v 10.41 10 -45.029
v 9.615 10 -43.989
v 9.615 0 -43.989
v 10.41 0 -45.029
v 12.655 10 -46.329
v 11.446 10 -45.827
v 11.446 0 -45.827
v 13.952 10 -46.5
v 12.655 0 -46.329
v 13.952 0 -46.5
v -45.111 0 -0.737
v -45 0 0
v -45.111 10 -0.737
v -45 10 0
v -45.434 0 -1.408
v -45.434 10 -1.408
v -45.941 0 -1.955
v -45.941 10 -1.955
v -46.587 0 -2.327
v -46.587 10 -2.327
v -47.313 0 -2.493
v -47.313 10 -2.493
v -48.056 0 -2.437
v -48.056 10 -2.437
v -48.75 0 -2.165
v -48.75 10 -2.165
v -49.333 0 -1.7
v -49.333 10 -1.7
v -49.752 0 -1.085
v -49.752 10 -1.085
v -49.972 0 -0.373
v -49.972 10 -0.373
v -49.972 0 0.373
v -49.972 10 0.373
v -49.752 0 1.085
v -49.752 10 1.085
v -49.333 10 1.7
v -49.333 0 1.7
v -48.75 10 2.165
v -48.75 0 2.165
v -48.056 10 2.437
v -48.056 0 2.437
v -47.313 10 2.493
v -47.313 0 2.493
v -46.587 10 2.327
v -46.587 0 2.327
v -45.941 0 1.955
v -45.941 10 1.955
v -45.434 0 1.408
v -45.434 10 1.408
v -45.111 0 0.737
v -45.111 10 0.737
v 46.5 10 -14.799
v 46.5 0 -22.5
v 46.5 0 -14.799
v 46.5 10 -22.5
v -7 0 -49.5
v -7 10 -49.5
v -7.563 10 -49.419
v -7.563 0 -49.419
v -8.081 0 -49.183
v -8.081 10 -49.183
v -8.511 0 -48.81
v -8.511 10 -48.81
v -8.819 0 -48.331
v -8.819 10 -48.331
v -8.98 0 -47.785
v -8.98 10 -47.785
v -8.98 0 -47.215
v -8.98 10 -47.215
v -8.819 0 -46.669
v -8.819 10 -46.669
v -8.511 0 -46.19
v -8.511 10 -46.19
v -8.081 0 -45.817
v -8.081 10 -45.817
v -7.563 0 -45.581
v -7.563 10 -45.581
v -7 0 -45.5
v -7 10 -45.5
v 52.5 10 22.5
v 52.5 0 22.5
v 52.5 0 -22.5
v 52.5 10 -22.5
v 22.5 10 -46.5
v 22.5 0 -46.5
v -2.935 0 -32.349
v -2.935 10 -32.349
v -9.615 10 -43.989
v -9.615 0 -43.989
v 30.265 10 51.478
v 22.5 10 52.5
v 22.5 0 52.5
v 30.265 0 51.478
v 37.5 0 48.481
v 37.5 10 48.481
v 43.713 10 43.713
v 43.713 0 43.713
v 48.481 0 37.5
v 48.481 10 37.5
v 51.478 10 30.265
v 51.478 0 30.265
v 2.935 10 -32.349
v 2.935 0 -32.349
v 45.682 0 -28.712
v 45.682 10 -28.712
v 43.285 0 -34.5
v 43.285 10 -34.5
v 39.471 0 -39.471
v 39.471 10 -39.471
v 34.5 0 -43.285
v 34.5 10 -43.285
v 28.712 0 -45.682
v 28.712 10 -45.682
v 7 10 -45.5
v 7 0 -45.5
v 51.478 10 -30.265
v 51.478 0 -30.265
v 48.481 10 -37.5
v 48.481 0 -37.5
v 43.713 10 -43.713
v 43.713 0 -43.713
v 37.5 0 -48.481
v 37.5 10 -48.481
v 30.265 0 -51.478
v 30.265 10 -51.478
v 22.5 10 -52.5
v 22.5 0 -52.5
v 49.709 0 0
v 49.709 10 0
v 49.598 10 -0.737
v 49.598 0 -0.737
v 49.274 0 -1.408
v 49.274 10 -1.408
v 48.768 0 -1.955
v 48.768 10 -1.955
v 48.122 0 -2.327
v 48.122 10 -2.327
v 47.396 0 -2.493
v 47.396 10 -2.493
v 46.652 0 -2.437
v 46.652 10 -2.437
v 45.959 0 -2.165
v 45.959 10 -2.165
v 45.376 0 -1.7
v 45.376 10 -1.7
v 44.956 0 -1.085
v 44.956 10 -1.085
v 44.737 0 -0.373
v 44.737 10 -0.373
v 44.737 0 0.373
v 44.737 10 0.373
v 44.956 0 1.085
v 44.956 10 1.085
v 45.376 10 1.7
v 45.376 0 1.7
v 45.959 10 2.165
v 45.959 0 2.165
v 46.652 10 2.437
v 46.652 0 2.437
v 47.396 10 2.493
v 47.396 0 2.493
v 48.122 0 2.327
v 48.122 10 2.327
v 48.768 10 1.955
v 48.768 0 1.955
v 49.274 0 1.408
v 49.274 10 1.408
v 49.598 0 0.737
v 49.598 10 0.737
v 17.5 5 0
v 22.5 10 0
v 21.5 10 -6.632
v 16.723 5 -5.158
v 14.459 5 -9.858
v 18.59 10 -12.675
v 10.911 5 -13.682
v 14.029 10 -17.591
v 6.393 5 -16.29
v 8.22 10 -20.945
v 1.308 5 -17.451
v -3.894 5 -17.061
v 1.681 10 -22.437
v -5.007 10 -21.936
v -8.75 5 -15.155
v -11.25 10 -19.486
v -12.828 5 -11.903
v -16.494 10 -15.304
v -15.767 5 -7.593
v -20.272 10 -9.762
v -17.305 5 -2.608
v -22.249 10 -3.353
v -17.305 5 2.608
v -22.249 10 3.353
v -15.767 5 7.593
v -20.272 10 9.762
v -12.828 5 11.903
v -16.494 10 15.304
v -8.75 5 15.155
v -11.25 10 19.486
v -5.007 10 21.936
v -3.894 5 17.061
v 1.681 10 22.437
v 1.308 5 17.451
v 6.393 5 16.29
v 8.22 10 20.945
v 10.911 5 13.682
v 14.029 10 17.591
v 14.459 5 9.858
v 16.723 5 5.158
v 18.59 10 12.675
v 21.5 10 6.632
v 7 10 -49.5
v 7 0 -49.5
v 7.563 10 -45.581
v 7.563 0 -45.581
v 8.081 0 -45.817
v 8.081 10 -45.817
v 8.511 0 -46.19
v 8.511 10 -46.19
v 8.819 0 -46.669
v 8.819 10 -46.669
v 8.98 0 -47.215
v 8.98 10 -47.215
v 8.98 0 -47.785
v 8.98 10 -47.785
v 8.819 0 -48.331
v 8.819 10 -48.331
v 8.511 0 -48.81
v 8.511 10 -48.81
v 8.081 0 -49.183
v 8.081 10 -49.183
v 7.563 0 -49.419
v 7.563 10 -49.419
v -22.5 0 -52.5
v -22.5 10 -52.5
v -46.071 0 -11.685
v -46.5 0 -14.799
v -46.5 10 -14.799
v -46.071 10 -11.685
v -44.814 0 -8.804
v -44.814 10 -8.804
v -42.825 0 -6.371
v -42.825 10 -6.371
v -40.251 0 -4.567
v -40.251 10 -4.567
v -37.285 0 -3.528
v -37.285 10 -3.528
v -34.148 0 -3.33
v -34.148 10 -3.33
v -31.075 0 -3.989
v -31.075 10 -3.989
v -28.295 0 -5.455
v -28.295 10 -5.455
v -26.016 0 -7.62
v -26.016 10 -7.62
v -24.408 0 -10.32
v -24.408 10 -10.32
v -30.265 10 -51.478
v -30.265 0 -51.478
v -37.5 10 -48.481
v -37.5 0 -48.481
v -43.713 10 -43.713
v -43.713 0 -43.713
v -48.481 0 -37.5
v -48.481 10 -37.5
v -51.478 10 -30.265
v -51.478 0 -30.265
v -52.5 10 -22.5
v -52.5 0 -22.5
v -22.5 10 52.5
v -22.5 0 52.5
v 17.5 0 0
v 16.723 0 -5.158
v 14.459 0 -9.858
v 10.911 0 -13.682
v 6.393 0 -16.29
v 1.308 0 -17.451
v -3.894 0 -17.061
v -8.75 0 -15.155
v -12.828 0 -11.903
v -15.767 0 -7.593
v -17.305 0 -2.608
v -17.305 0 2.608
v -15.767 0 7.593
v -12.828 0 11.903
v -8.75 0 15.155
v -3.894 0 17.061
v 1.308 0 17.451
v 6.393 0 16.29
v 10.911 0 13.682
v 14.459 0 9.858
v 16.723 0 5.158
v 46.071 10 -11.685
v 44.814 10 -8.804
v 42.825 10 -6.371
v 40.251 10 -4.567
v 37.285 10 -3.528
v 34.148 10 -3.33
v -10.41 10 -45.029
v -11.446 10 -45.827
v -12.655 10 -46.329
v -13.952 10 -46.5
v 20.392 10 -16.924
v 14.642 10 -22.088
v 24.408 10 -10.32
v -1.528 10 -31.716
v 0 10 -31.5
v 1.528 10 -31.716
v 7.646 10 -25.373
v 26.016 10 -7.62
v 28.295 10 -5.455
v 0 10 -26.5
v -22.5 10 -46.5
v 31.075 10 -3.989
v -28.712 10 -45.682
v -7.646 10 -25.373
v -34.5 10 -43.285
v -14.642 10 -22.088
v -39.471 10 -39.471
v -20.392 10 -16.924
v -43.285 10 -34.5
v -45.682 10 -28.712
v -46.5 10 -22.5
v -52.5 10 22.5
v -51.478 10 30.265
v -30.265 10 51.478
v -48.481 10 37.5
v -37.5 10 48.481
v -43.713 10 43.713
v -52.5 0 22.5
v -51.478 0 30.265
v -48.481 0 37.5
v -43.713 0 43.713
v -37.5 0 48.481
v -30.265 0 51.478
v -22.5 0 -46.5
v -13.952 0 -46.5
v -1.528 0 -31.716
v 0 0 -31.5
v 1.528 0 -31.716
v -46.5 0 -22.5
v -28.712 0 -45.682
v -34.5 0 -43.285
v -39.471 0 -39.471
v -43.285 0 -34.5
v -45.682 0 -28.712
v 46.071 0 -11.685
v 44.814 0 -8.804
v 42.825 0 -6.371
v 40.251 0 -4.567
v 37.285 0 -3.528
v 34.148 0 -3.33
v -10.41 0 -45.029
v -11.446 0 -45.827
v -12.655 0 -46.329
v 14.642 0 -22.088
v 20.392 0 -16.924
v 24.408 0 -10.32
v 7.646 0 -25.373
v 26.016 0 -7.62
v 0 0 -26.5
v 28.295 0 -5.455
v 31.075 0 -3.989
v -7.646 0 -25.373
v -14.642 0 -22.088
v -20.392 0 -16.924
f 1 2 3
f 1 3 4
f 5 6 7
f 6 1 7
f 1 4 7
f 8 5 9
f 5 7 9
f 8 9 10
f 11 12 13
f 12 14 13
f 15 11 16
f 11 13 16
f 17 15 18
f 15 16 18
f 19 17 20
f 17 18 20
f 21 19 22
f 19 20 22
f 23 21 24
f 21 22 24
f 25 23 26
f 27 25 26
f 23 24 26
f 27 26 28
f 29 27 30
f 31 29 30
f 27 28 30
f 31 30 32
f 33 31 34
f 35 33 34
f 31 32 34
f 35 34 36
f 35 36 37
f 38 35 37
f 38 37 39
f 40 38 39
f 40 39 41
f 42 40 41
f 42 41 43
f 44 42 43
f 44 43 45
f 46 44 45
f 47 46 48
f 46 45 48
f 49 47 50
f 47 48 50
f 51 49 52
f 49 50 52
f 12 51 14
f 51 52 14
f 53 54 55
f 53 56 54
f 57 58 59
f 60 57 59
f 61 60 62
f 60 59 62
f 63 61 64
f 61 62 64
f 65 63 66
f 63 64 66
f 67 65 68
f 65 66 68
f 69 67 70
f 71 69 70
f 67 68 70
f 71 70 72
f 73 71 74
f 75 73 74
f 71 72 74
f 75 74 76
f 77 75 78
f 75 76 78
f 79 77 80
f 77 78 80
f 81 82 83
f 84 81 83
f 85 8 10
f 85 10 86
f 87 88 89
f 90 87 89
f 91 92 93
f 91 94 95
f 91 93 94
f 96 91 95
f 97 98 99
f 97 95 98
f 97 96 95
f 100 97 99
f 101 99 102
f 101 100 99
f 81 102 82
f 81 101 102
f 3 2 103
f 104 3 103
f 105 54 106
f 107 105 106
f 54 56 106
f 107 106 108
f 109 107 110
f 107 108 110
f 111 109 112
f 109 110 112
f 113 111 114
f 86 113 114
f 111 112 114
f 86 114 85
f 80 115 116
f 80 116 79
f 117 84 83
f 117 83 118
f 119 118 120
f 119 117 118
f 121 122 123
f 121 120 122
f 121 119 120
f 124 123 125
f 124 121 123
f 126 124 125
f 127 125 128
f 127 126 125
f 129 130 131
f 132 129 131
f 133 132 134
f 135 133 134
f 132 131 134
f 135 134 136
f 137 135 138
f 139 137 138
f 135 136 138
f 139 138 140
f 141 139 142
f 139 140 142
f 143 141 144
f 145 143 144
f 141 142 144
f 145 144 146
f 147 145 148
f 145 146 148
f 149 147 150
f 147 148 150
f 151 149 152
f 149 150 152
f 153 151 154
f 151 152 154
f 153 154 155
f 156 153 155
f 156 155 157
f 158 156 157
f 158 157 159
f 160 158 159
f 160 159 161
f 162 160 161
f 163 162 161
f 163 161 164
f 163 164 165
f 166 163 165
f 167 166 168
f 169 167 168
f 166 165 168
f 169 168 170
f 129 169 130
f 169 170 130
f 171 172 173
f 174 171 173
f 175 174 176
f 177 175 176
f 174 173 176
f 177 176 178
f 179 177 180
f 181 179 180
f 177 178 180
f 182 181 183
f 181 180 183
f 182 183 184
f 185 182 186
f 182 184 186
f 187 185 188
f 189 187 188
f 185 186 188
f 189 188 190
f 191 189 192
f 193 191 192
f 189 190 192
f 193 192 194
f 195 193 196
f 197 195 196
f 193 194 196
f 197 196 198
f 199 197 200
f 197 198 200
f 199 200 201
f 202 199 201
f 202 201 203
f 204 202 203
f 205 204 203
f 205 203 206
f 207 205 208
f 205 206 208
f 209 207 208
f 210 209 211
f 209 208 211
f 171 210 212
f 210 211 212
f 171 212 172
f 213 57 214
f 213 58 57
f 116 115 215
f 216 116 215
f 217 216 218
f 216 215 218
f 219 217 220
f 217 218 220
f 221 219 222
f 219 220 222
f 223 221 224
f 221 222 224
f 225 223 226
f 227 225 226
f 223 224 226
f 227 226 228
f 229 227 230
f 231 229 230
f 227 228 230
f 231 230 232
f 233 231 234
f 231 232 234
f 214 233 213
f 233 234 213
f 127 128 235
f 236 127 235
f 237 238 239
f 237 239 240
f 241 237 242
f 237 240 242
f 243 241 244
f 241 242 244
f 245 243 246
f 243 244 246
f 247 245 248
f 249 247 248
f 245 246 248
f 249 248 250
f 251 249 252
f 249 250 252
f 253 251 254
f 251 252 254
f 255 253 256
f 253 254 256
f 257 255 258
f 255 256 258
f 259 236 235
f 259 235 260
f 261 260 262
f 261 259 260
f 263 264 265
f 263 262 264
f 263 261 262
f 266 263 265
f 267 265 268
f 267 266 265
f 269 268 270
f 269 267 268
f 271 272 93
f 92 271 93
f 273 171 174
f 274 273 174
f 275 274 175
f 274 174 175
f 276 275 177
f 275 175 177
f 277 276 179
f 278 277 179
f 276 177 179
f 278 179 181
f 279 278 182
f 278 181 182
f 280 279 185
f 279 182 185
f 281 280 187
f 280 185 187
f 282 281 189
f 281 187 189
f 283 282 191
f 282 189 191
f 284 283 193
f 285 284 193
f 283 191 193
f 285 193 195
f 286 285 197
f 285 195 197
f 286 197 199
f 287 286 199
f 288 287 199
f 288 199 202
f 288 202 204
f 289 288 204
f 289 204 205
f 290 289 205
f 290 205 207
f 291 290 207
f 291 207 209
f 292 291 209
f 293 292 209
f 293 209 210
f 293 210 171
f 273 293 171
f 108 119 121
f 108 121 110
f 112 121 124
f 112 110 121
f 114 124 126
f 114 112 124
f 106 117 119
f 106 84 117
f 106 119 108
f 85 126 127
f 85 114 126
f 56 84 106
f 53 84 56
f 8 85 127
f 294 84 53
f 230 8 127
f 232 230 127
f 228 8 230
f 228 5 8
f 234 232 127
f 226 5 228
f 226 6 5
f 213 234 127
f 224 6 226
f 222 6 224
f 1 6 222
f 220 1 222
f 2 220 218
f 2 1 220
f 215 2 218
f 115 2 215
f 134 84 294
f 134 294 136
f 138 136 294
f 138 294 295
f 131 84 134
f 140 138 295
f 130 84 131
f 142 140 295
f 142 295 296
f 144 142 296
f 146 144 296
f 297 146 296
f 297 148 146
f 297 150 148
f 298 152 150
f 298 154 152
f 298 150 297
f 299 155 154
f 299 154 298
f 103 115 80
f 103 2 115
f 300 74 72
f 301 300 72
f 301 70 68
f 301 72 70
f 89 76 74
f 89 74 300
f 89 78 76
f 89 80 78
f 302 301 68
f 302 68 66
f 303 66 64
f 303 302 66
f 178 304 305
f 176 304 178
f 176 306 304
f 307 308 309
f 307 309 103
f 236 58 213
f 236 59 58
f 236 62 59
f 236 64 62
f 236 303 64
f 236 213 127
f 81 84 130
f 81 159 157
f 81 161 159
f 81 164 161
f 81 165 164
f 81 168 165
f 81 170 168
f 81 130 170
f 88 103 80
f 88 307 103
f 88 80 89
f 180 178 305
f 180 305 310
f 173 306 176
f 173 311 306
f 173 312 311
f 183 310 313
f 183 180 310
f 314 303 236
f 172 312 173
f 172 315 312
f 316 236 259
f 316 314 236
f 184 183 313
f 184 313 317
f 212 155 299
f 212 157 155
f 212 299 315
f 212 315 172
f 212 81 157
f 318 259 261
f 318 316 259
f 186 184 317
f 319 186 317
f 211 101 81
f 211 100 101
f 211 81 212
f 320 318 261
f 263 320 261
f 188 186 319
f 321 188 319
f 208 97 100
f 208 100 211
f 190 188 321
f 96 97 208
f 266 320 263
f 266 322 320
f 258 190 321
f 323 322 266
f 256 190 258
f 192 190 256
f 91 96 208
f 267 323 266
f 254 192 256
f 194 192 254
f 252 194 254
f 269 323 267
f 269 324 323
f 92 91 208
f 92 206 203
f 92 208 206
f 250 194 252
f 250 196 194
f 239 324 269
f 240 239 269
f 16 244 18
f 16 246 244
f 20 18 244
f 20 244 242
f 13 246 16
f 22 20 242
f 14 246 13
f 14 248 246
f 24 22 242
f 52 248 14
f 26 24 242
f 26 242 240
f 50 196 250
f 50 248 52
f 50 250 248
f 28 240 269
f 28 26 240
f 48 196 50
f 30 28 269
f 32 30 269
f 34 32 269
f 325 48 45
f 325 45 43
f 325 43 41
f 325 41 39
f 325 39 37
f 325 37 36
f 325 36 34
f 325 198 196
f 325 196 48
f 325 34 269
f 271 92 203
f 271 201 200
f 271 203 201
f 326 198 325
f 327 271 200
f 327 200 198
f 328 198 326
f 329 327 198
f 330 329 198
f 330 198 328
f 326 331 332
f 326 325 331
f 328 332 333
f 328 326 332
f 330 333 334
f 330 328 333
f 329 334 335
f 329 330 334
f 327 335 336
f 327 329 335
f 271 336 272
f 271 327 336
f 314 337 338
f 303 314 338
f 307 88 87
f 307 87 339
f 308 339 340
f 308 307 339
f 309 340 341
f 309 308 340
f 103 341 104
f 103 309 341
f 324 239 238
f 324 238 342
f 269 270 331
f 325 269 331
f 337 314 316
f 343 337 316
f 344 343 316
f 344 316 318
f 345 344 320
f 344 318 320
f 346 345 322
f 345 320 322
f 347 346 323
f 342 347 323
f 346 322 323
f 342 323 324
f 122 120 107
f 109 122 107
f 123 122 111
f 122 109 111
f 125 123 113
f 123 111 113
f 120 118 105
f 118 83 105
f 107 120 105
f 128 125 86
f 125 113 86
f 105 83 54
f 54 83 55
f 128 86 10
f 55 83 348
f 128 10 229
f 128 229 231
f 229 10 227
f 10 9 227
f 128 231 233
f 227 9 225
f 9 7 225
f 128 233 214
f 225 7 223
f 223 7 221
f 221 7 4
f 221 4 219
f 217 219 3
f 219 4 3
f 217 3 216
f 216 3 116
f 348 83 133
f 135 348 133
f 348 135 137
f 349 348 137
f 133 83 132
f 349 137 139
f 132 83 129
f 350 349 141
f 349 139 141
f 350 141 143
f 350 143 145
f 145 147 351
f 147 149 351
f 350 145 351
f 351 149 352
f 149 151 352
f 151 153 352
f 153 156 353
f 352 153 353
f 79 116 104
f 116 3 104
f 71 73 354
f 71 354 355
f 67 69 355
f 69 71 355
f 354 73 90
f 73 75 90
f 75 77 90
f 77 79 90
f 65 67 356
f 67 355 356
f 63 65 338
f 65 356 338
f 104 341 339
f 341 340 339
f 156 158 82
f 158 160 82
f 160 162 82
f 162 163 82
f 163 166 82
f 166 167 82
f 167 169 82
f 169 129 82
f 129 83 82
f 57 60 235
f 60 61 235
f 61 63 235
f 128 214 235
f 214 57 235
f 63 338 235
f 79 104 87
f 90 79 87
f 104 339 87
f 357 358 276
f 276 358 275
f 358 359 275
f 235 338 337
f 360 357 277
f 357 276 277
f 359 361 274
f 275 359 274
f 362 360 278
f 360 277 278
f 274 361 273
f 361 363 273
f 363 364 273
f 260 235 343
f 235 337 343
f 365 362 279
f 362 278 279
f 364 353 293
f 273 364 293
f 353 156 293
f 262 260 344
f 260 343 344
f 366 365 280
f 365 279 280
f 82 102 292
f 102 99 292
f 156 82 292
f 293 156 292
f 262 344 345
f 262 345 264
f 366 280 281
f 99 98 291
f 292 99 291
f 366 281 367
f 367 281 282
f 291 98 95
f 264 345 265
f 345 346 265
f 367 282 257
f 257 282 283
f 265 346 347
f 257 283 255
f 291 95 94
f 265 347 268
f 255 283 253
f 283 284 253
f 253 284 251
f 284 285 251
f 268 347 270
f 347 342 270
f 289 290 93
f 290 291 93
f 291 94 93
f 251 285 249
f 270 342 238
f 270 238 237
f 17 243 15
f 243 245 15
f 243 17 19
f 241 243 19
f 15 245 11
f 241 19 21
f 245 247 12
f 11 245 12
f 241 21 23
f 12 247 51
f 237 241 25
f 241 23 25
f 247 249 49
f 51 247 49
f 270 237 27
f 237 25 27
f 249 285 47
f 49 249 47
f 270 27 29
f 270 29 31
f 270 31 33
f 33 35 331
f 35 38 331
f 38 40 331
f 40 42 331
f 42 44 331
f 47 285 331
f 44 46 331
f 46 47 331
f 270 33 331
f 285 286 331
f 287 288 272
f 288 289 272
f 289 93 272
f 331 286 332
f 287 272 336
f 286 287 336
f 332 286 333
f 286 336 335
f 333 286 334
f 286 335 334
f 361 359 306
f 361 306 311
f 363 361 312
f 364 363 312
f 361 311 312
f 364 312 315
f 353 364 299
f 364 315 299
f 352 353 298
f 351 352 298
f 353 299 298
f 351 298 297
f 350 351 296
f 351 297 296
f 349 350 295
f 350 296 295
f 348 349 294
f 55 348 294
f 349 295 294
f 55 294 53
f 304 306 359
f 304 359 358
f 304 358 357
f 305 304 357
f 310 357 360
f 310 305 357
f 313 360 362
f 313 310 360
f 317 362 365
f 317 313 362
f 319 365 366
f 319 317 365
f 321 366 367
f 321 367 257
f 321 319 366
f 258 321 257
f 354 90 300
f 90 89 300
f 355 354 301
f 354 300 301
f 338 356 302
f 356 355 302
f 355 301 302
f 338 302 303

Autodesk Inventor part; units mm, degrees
ref_plane "YZ Plane" through (0, 0, 0) normal (1, 0, 0) x (0, 1, 0)
ref_plane "XZ Plane" through (0, 0, 0) normal (0, 1, 0) x (-1, 0, 0)
ref_plane "XY Plane" through (0, 0, 0) normal (0, 0, 1) x (1, 0, 0)
sketch "Sketch1" plane through (0, 0, 0) normal (0, 1, 0) x (-1, 0, 0)
  line L0 (52.5, 52.5) -> (-52.5, 52.5)
  line L1 (-52.5, 52.5) -> (-52.5, -52.5)
  line L2 (-52.5, -52.5) -> (52.5, -52.5)
  line L3 (52.5, -52.5) -> (52.5, 52.5)
  line L4 (52.5, 52.5) -> (-52.5, -52.5) construction
  line L5 (-52.5, 52.5) -> (52.5, -52.5) construction
  point P0 (0, 0)
  dimension "d0" = 105
  dimension "d1" = 105
extrude "Extrusion1" add sketch "Sketch1" along normal blind 10
fillet "Fillet1" radius 30 4 edges at (-52.5, 5, -52.5) (-52.5, 5, 52.5) (52.5, 5, -52.5) (52.5, 5, 52.5)
sketch "Sketch2" plane through (0, 10, 0) normal (0, 1, 0) x (1, 0, 0)
  circle A0 centre (0, 0) radius 17.5
  dimension "d5" = 35
extrude "Extrusion2" cut sketch "Sketch2" against normal blind 10
chamfer "Chamfer1" distance 5 angle 45 1 edges at (-17.5, 10, 0)
sketch "Sketch3" plane through (0, 10, 0) normal (0, 1, 0) x (1, 0, 0)
  arc A0 (22.5, -52.5) -> (52.5, -22.5) centre (22.5, -22.5) ccw projected
  line L0 (52.5, -22.5) -> (52.5, 22.5) projected
  arc A1 (52.5, 22.5) -> (22.5, 52.5) centre (22.5, 22.5) ccw projected
  line L1 (22.5, 52.5) -> (-22.5, 52.5) projected
  arc A2 (-22.5, 52.5) -> (-52.5, 22.5) centre (-22.5, 22.5) ccw projected
  line L2 (-52.5, 22.5) -> (-52.5, -22.5) projected
  arc A3 (-52.5, -22.5) -> (-22.5, -52.5) centre (-22.5, -22.5) ccw projected
  line L3 (-22.5, -52.5) -> (22.5, -52.5) projected
  circle A4 centre (0, 0) radius 22.5 projected
  line L4 (46.5, 22.5) -> (46.5, -22.5)
  arc A5 (22.5, -46.5) -> (46.5, -22.5) centre (22.5, -22.5) ccw
  line L5 (22.5, -46.5) -> (-22.5, -46.5)
  arc A6 (-46.5, -22.5) -> (-22.5, -46.5) centre (-22.5, -22.5) ccw
  line L6 (-46.5, -22.5) -> (-46.5, 22.5)
  arc A7 (-22.5, 46.5) -> (-46.5, 22.5) centre (-22.5, 22.5) ccw
  line L7 (-22.5, 46.5) -> (22.5, 46.5)
  arc A8 (46.5, 22.5) -> (22.5, 46.5) centre (22.5, 22.5) ccw
  circle A9 centre (0, 0) radius 26.5
  arc A10 (24.4079, 10.3201) -> (46.5, 14.7986) centre (35, 14.7986) ccw
  arc A11 (-46.5, 14.7986) -> (-24.4079, 10.3201) centre (-35, 14.7986) ccw
  dimension "d11" = 6
  dimension "d12" = 4
  dimension "d13" = 23
  dimension "d14" = 23
extrude "Extrusion3" cut sketch "Sketch3" against normal blind 10 contours L4 A10 A9 A11 L6 A7 L7 A8
sketch "Sketch5" plane through (0, 10, 0) normal (0, 1, 0) x (1, 0, 0)
  line L0 (52.2088, 0) -> (47.2088, 0)
  line L1 (-52.5, 22.5) -> (-52.5, -22.5) projected
  line L2 (-52.5, 0) -> (-47.5, 0)
  circle A0 centre (47.2088, 0) radius 2.5
  circle A1 centre (-47.5, 0) radius 2.5
  point P0 (0, 0)
  dimension "d21" = 5
  dimension "d22" = 5
  dimension "d23" = 5
  dimension "d24" = 5
extrude "Extrusion4" cut sketch "Sketch5" against normal blind 10
sketch "Sketch6" plane through (0, 10, 0) normal (0, 1, 0) x (1, 0, 0)
  line L0 (52.5, 52.5) -> (14.5, 52.5)
  line L1 (22.5, 52.5) -> (-22.5, 52.5) projected
  line L2 (-52.5, 52.5) -> (-14.5, 52.5)
  line L3 (0, 52.5) -> (0, 31.5)
  line L4 (0, 31.5) -> (0, 37)
  arc A0 (-5.4968, 36.8121) -> (5.4968, 36.8121) centre (0, 37) ccw
  line L5 (14.5, 52.5) -> (2.9353, 32.3488)
  line L6 (-2.9353, 32.3488) -> (-14.5, 52.5)
  point P0 (0, 0)
  dimension "d27" = 38
  dimension "d28" = 38
  dimension "d29" = 21
  dimension "d30" = 5.5
  dimension "d31" = 11
extrude "Extrusion5" add sketch "Sketch6" against normal blind 10 contours L5 A0 L3 L1 | L3 A0 L6 L1
fillet "Fillet2" radius 5 2 edges at (11.0566, 5, -46.5) (-11.0566, 5, -46.5)
sketch "Sketch7" plane through (0, 10, 0) normal (0, 1, 0) x (1, 0, 0)
  line L0 (22.5, 52.5) -> (-22.5, 52.5) projected
  line L1 (0, 47.5) -> (-7, 47.5)
  line L2 (-7, 47.5) -> (7, 47.5)
  arc A0 (7, 45.5) -> (7, 49.5) centre (7, 47.5) ccw
  arc A1 (-7, 49.5) -> (-7, 45.5) centre (-7, 47.5) ccw
  line L3 (7, 45.5) -> (-7, 45.5)
  line L4 (-7, 49.5) -> (7, 49.5)
  point P0 (0, 0)
  dimension "d37" = 14
  dimension "d38" = 4
  dimension "d39" = 4
extrude "Extrusion6" cut sketch "Sketch7" against normal blind 10
properties part number "Del 6"
